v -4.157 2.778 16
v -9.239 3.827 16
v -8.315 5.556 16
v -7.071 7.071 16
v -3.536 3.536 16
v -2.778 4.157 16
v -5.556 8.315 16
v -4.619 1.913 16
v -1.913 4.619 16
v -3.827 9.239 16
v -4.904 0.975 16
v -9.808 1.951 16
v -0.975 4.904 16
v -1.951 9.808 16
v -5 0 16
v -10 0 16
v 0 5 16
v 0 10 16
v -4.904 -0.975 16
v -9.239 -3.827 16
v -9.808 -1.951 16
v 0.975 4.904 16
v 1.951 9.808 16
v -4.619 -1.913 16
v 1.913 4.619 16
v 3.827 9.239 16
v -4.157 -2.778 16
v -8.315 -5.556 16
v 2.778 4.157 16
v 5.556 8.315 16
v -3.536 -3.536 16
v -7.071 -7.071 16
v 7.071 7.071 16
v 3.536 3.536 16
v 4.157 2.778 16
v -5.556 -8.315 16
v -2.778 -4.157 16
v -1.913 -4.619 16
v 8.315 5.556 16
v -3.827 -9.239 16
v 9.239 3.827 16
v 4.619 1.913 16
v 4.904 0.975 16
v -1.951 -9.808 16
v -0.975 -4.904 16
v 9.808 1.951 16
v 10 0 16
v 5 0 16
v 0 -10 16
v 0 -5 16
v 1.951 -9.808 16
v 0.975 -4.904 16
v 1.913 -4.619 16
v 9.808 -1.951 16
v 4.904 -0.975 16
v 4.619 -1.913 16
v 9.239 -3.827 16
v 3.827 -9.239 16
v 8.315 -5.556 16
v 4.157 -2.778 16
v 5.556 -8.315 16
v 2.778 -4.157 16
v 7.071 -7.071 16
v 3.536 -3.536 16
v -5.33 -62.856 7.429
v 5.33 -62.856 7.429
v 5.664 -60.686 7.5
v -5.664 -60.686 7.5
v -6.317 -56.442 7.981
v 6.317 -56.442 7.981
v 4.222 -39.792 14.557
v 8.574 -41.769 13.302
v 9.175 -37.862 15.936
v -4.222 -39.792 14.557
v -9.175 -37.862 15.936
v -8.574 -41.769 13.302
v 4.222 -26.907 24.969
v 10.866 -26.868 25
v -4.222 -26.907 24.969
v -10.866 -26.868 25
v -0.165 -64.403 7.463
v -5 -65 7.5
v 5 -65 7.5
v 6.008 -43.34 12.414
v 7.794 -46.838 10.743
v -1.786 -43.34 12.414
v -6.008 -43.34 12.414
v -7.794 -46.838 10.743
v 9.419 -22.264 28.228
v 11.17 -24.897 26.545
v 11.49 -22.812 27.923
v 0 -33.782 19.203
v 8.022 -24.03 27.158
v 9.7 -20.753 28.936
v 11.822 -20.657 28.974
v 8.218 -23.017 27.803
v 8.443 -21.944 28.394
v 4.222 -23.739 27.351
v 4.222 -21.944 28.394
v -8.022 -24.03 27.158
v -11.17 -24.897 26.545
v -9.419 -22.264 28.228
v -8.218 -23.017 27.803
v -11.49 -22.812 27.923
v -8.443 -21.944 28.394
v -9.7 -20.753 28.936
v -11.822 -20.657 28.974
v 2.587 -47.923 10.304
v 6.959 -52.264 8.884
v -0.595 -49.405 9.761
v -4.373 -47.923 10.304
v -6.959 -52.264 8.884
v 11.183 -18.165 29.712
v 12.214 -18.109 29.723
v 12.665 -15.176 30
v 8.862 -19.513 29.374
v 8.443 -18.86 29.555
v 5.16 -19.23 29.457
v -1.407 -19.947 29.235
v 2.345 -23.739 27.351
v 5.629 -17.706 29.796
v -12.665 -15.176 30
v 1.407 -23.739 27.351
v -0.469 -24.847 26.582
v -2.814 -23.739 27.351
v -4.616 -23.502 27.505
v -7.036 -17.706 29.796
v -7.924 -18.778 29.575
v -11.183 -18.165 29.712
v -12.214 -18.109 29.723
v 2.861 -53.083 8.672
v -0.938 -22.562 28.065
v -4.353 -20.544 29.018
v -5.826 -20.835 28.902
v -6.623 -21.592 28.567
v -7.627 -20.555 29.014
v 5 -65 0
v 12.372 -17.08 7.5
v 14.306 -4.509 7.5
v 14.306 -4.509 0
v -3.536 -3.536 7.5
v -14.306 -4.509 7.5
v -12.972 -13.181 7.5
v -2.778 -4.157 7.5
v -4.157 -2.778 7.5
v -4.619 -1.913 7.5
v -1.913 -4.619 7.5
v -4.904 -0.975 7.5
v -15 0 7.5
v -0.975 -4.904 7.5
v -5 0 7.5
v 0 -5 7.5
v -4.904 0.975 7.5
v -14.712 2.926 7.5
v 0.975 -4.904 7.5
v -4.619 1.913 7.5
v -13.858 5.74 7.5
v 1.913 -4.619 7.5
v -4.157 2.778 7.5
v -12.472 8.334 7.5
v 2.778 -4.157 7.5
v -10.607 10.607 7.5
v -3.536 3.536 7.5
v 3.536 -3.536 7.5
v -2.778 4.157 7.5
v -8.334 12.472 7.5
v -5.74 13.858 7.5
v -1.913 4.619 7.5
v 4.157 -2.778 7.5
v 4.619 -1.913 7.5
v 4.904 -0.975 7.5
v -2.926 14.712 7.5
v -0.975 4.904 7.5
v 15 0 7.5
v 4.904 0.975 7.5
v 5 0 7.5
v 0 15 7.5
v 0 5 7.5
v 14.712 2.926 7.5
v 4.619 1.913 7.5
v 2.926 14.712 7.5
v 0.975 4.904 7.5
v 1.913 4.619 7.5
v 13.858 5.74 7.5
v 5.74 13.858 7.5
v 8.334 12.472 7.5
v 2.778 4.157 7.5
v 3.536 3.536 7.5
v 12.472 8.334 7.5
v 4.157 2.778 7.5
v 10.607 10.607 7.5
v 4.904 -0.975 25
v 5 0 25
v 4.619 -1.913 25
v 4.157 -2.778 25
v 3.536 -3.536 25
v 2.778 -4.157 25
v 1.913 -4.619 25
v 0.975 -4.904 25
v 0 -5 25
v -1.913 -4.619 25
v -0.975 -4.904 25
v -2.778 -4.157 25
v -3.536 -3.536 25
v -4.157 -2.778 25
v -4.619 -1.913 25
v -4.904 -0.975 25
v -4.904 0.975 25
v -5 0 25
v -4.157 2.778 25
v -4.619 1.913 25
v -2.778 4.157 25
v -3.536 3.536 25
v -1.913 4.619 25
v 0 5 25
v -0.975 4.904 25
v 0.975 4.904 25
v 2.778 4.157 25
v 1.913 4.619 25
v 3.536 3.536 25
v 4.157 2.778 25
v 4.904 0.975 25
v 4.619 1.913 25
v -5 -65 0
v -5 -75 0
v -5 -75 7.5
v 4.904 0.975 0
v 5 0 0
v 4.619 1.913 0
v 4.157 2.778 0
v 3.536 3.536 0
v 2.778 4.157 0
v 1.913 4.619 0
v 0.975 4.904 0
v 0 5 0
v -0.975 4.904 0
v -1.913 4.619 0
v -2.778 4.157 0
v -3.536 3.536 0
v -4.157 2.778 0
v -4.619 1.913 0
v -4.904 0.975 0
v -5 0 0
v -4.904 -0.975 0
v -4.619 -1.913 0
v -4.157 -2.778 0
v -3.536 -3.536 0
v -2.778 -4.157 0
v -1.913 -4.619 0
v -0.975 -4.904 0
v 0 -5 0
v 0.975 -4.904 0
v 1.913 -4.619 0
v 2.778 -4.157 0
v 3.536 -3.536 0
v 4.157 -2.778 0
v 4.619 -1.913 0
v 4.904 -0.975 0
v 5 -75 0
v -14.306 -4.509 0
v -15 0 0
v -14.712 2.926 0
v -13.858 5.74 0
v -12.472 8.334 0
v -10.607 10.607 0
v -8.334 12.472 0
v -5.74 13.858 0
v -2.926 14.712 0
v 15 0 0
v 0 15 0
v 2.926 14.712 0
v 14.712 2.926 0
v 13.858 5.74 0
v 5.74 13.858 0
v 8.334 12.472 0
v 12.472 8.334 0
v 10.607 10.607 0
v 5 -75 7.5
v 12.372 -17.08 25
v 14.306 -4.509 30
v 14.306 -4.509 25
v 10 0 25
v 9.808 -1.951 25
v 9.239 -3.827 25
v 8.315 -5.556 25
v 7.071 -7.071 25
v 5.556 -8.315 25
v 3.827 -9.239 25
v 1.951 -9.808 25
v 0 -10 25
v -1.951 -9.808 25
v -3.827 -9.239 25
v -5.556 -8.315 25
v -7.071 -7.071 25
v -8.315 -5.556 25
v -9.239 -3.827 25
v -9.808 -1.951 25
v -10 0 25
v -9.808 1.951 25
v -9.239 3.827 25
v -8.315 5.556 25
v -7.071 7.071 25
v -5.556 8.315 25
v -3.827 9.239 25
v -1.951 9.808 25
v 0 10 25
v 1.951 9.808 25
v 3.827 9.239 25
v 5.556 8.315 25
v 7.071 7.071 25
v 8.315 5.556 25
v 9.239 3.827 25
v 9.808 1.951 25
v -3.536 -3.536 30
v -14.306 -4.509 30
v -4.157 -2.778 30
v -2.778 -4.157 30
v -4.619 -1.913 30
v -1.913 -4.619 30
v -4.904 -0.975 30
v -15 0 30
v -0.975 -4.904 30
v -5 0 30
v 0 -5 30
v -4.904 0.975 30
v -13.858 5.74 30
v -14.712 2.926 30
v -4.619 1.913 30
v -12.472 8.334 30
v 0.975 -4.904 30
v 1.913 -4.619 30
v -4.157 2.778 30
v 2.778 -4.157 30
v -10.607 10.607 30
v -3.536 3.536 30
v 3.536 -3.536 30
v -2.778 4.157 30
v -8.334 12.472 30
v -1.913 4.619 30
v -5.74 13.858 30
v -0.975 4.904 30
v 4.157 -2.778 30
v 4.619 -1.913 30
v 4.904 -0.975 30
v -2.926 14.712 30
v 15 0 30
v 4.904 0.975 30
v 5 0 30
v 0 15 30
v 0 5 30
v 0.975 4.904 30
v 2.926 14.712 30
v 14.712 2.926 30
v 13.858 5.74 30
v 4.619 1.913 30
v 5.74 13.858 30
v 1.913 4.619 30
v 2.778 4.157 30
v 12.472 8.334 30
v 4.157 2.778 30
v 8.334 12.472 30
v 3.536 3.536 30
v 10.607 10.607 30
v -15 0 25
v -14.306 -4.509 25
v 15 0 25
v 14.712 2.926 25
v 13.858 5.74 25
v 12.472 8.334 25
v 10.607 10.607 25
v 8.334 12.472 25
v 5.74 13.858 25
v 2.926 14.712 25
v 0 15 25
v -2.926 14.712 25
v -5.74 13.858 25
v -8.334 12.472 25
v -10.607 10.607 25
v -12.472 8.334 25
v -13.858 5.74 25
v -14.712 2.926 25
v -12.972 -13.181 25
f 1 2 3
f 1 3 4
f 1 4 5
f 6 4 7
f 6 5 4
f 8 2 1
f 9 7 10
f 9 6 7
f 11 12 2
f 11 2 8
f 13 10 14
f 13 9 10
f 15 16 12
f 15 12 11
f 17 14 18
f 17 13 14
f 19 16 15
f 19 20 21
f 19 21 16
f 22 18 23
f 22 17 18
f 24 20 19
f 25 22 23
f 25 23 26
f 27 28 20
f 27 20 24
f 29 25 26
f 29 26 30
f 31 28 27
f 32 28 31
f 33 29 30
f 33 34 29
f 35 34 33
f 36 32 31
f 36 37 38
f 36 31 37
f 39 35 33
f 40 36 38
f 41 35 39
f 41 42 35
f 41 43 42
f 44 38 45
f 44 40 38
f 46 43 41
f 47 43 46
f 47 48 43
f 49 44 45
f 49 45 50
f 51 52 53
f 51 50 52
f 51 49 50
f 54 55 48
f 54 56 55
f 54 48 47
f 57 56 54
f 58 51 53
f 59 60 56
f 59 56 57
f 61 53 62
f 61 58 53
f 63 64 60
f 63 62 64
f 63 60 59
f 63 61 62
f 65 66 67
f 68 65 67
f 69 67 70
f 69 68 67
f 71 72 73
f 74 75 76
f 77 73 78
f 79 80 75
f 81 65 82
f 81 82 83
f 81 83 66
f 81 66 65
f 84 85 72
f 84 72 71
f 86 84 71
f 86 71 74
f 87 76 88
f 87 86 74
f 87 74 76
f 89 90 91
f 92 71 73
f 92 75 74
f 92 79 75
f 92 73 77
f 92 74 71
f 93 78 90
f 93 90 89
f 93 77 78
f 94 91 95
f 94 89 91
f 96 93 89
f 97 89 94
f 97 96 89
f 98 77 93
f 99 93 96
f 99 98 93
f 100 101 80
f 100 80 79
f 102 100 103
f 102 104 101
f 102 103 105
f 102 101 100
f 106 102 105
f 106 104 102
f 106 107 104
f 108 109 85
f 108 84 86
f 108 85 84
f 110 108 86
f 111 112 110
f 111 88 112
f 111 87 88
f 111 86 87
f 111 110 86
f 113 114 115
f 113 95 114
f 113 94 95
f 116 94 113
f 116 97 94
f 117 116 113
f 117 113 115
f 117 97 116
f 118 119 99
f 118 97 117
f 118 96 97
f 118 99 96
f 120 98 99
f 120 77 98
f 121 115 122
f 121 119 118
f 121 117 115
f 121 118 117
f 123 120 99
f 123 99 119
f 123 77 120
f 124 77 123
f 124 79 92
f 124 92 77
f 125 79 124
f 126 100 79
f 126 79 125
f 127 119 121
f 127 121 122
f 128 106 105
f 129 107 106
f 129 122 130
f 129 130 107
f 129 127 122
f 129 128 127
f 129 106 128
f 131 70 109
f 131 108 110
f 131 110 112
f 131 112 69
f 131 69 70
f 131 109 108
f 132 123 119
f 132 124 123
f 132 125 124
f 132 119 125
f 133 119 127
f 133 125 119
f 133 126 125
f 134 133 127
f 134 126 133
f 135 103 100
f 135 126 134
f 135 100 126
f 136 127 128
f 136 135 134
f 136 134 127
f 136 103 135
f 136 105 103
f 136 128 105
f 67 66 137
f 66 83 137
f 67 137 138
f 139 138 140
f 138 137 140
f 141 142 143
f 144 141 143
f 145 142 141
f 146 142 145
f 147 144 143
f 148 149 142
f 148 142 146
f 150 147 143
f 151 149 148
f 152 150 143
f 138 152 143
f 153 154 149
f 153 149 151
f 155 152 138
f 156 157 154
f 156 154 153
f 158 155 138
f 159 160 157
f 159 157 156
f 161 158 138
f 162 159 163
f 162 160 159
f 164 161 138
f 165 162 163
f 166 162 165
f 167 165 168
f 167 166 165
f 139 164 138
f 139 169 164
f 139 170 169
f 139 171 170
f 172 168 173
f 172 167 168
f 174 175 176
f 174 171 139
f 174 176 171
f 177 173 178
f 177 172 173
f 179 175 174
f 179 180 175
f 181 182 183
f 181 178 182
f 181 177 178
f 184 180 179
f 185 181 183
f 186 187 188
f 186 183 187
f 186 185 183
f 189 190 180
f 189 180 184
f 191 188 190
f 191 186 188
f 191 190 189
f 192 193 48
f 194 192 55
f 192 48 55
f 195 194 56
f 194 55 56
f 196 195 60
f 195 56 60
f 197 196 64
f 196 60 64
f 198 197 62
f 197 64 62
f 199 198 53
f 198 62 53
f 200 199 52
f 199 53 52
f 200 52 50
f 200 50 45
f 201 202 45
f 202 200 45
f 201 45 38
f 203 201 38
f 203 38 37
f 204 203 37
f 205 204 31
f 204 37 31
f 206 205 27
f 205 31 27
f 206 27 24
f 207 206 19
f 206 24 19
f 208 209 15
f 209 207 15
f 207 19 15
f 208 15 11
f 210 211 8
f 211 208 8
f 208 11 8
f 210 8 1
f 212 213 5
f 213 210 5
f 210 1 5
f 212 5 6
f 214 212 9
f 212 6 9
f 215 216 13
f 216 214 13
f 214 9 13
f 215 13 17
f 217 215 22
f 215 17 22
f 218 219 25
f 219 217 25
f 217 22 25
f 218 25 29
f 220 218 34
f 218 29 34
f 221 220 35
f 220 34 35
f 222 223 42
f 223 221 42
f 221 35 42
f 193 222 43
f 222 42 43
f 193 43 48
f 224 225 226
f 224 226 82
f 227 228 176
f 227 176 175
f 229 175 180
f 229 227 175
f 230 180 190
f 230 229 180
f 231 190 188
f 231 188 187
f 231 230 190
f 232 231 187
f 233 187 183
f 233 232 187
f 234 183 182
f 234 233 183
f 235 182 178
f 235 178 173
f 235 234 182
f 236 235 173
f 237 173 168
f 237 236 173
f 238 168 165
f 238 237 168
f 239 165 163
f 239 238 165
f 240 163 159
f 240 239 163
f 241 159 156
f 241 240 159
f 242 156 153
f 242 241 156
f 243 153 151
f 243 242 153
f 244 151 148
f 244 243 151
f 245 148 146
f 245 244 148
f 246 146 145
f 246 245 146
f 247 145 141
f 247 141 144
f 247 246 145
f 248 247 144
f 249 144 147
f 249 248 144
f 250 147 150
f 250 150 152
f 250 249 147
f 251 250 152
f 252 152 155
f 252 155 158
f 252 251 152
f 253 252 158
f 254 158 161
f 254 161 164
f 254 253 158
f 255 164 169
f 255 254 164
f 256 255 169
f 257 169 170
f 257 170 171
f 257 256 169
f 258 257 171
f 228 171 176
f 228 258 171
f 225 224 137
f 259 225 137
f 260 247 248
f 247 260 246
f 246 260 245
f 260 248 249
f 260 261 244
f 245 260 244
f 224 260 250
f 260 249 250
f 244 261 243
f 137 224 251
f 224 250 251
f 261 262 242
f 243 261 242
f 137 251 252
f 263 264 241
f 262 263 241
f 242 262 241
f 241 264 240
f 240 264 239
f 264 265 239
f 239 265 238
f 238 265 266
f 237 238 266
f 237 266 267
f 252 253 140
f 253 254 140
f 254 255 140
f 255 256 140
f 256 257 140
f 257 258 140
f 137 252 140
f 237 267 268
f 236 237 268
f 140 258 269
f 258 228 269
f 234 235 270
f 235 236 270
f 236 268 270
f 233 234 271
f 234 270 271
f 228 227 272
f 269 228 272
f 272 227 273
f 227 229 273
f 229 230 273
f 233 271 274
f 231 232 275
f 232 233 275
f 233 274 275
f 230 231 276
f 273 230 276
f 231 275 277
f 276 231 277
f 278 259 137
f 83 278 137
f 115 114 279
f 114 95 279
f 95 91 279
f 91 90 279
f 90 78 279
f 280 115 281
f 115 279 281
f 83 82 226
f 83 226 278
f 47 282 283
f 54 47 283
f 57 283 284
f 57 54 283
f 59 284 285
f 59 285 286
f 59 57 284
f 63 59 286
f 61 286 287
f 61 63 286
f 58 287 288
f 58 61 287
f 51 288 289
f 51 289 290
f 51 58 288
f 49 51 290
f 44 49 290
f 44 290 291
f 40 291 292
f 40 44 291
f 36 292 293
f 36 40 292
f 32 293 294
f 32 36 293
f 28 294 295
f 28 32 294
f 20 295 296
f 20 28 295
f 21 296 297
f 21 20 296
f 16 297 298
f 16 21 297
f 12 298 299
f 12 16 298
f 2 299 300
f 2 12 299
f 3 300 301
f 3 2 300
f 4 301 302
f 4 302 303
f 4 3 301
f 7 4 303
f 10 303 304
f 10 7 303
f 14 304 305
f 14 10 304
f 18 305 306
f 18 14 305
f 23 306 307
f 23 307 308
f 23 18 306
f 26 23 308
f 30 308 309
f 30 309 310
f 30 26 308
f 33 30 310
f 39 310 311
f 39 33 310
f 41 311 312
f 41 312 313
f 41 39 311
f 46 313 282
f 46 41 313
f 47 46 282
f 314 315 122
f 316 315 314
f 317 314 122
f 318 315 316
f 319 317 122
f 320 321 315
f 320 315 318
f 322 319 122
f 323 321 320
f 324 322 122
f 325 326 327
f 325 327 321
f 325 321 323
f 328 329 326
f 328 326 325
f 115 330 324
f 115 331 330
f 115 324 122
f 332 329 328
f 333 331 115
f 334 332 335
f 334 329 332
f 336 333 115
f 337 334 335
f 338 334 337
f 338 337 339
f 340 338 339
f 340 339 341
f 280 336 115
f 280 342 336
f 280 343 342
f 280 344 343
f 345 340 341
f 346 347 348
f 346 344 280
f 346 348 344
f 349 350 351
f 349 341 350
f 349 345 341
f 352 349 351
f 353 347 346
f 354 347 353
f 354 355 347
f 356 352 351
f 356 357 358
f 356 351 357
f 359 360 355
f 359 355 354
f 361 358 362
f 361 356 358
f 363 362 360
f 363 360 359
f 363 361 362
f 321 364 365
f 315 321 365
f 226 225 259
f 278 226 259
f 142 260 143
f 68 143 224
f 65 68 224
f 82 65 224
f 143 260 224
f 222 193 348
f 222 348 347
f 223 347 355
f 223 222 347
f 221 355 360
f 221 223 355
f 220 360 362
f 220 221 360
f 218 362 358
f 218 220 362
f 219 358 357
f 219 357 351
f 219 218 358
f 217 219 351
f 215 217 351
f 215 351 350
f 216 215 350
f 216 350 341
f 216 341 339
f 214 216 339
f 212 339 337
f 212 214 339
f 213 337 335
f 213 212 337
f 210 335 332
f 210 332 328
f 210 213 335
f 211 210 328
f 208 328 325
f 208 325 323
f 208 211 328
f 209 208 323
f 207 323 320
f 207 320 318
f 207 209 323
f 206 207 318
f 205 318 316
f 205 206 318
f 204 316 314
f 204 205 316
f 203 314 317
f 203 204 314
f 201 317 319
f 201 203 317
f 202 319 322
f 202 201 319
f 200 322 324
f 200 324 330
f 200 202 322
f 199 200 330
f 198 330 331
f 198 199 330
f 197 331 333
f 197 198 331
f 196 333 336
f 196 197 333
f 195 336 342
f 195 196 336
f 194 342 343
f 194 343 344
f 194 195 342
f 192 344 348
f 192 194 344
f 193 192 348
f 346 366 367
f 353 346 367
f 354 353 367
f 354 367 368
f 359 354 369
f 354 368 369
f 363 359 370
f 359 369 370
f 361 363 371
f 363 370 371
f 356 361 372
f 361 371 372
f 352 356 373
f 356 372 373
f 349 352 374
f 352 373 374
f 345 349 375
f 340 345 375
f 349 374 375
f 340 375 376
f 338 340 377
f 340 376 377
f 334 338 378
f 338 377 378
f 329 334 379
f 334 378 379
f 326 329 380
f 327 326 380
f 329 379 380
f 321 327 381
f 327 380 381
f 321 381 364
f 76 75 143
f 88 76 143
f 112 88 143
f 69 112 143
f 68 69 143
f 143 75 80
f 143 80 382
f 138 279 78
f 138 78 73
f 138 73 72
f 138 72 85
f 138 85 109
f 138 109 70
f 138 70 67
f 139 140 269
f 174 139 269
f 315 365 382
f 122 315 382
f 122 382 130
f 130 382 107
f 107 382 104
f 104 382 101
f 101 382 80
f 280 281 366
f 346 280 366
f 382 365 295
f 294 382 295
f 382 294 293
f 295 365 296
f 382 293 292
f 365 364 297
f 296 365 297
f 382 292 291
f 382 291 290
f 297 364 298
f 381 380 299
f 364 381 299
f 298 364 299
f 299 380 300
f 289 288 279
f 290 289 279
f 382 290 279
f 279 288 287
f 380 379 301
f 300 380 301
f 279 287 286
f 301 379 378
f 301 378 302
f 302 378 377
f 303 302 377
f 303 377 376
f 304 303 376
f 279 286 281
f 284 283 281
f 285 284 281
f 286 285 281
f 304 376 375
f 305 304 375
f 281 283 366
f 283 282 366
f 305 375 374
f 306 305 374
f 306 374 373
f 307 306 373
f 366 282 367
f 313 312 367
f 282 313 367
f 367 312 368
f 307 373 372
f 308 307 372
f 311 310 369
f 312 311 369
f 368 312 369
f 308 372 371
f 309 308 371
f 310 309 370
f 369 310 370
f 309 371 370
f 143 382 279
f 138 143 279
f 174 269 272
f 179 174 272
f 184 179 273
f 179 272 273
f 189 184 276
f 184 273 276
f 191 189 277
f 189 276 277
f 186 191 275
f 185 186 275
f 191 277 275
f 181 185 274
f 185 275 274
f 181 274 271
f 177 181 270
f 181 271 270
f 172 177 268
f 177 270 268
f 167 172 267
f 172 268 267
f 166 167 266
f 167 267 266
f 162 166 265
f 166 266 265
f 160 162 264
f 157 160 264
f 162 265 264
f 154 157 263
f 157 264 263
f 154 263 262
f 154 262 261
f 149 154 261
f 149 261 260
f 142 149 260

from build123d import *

# Parameters (mm, degrees)
ESQUISSE1_R                  = 5
ESQUISSE1_W                  = 10
ESQUISSE1_H                  = 10
BOSS_EXTRU_1_DEPTH           = 7.5
ESQUISSE2_R                  = 5
BOSS_EXTRU_2_DEPTH           = 5
BOSS_EXTRU_3_DEPTH           = 17.5
ENL_V_MAT_EXTRU_1_DEPTH      = 83.158383626
ENL_V_MAT_EXTRU_1_DEPTH_BACK = 83.158383626
BOSS_EXTRU_4_START           = 9
ESQUISSE5_R                  = 10
ESQUISSE5_R_2                = 5
BOSS_EXTRU_4_DEPTH           = 9


with BuildPart() as part:
    # Esquisse1 → Boss.-Extru.1 (new body)
    # profile 1 of 3: a face of its own
    with BuildSketch(Plane.XY):
        with BuildLine():
            ThreePointArc((14.306358382, -4.50867052), (0, -15), (-14.306358382, -4.50867052))
            Line((-14.306358382, -4.50867052), (-5, -65))
            Line((-5, -65), (5, -65))
            Line((5, -65), (14.306358382, -4.50867052))
        make_face()
    # profile 2 of 3: a face of its own
    with BuildSketch(Plane.XY):
        with BuildLine():
            ThreePointArc((15, 0), (0, 15), (-15, 0))
            Line((-15, 0), (-14.306358382, -4.50867052))
            ThreePointArc((-14.306358382, -4.50867052), (0, -15), (14.306358382, -4.50867052))
            Line((14.306358382, -4.50867052), (15, 0))
        make_face()
        Circle(ESQUISSE1_R, mode=Mode.SUBTRACT)
    # profile 3 of 3: a face of its own
    with BuildSketch(Plane.XY):
        with Locations((0, -70)):
            Rectangle(ESQUISSE1_W, ESQUISSE1_H)
    extrude(amount=BOSS_EXTRU_1_DEPTH)



with BuildPart() as body_2:
    # Esquisse2 → Boss.-Extru.2 (new body)
    # profile 1 of 2: a face of its own
    with BuildSketch(Plane.XY.offset(25)):
        with BuildLine():
            ThreePointArc((14.306358382, -4.50867052), (0, -15), (-14.306358382, -4.50867052))
            Line((-14.306358382, -4.50867052), (-5, -65))
            Line((-5, -65), (5, -65))
            Line((5, -65), (14.306358382, -4.50867052))
        make_face()
    # profile 2 of 2: a face of its own
    with BuildSketch(Plane.XY.offset(25)):
        with BuildLine():
            ThreePointArc((15, 0), (0, 15), (-15, 0))
            Line((-15, 0), (-14.306358382, -4.50867052))
            ThreePointArc((-14.306358382, -4.50867052), (0, -15), (14.306358382, -4.50867052))
            Line((14.306358382, -4.50867052), (15, 0))
        make_face()
        Circle(ESQUISSE2_R, mode=Mode.SUBTRACT)
    extrude(amount=BOSS_EXTRU_2_DEPTH)


with BuildPart() as part_1:
    add(part.part)

    add(body_2.part)  # Boss.-Extru.3 merges body 2
    # Esquisse3 → Boss.-Extru.3 (add)
    with BuildSketch(Plane(origin=(0, 0, 25), x_dir=(-1, 0, 0), z_dir=(0, 0, -1))):
        Polygon((12.972191557, -13.180754881), (-12.372321427, -17.079910725), (-5, -65), (5, -65), align=None)
    extrude(amount=BOSS_EXTRU_3_DEPTH)

    # Esquisse4 → Enlèv. mat.-Extru.1 (cut, two sides: drawn at the far end of the back side and taken through both)
    with BuildSketch(Plane(origin=(0, 0, 0), x_dir=(0, 0, -1), z_dir=(1, 0, 0)).offset(-ENL_V_MAT_EXTRU_1_DEPTH_BACK)):
        with BuildLine():
            Line((-30, -15.176476659), (-30, -65))
            Line((-30, -65), (-7.5, -65))
            add(Edge.make_bspline(
                [(-7.5, -65), (-7.5, -64.789009401), (-5.808728882, -48.116944639), (-22.947732818, -29.702706462), (-30, -20.554677266), (-30, -15.176476659)],
                knots=[0, 0, 0, 0, 0.665017027, 0.876258151, 1, 1, 1, 1], degree=3))
        make_face()
    extrude(amount=ENL_V_MAT_EXTRU_1_DEPTH + ENL_V_MAT_EXTRU_1_DEPTH_BACK, mode=Mode.SUBTRACT)

    # Esquisse5 → Boss.-Extru.4 (add)
    with BuildSketch(Plane(origin=(0, 0, 25), x_dir=(-1, 0, 0), z_dir=(0, 0, -1)).offset(BOSS_EXTRU_4_START)):
        with Locations(Location((0, 0, 0), (0, 0, 180))):
            Circle(ESQUISSE5_R)
        with Locations(Location((0, 0, 0), (0, 0, 180))):
            Circle(ESQUISSE5_R_2, mode=Mode.SUBTRACT)
    extrude(amount=-BOSS_EXTRU_4_DEPTH)


solid = part_1.part
